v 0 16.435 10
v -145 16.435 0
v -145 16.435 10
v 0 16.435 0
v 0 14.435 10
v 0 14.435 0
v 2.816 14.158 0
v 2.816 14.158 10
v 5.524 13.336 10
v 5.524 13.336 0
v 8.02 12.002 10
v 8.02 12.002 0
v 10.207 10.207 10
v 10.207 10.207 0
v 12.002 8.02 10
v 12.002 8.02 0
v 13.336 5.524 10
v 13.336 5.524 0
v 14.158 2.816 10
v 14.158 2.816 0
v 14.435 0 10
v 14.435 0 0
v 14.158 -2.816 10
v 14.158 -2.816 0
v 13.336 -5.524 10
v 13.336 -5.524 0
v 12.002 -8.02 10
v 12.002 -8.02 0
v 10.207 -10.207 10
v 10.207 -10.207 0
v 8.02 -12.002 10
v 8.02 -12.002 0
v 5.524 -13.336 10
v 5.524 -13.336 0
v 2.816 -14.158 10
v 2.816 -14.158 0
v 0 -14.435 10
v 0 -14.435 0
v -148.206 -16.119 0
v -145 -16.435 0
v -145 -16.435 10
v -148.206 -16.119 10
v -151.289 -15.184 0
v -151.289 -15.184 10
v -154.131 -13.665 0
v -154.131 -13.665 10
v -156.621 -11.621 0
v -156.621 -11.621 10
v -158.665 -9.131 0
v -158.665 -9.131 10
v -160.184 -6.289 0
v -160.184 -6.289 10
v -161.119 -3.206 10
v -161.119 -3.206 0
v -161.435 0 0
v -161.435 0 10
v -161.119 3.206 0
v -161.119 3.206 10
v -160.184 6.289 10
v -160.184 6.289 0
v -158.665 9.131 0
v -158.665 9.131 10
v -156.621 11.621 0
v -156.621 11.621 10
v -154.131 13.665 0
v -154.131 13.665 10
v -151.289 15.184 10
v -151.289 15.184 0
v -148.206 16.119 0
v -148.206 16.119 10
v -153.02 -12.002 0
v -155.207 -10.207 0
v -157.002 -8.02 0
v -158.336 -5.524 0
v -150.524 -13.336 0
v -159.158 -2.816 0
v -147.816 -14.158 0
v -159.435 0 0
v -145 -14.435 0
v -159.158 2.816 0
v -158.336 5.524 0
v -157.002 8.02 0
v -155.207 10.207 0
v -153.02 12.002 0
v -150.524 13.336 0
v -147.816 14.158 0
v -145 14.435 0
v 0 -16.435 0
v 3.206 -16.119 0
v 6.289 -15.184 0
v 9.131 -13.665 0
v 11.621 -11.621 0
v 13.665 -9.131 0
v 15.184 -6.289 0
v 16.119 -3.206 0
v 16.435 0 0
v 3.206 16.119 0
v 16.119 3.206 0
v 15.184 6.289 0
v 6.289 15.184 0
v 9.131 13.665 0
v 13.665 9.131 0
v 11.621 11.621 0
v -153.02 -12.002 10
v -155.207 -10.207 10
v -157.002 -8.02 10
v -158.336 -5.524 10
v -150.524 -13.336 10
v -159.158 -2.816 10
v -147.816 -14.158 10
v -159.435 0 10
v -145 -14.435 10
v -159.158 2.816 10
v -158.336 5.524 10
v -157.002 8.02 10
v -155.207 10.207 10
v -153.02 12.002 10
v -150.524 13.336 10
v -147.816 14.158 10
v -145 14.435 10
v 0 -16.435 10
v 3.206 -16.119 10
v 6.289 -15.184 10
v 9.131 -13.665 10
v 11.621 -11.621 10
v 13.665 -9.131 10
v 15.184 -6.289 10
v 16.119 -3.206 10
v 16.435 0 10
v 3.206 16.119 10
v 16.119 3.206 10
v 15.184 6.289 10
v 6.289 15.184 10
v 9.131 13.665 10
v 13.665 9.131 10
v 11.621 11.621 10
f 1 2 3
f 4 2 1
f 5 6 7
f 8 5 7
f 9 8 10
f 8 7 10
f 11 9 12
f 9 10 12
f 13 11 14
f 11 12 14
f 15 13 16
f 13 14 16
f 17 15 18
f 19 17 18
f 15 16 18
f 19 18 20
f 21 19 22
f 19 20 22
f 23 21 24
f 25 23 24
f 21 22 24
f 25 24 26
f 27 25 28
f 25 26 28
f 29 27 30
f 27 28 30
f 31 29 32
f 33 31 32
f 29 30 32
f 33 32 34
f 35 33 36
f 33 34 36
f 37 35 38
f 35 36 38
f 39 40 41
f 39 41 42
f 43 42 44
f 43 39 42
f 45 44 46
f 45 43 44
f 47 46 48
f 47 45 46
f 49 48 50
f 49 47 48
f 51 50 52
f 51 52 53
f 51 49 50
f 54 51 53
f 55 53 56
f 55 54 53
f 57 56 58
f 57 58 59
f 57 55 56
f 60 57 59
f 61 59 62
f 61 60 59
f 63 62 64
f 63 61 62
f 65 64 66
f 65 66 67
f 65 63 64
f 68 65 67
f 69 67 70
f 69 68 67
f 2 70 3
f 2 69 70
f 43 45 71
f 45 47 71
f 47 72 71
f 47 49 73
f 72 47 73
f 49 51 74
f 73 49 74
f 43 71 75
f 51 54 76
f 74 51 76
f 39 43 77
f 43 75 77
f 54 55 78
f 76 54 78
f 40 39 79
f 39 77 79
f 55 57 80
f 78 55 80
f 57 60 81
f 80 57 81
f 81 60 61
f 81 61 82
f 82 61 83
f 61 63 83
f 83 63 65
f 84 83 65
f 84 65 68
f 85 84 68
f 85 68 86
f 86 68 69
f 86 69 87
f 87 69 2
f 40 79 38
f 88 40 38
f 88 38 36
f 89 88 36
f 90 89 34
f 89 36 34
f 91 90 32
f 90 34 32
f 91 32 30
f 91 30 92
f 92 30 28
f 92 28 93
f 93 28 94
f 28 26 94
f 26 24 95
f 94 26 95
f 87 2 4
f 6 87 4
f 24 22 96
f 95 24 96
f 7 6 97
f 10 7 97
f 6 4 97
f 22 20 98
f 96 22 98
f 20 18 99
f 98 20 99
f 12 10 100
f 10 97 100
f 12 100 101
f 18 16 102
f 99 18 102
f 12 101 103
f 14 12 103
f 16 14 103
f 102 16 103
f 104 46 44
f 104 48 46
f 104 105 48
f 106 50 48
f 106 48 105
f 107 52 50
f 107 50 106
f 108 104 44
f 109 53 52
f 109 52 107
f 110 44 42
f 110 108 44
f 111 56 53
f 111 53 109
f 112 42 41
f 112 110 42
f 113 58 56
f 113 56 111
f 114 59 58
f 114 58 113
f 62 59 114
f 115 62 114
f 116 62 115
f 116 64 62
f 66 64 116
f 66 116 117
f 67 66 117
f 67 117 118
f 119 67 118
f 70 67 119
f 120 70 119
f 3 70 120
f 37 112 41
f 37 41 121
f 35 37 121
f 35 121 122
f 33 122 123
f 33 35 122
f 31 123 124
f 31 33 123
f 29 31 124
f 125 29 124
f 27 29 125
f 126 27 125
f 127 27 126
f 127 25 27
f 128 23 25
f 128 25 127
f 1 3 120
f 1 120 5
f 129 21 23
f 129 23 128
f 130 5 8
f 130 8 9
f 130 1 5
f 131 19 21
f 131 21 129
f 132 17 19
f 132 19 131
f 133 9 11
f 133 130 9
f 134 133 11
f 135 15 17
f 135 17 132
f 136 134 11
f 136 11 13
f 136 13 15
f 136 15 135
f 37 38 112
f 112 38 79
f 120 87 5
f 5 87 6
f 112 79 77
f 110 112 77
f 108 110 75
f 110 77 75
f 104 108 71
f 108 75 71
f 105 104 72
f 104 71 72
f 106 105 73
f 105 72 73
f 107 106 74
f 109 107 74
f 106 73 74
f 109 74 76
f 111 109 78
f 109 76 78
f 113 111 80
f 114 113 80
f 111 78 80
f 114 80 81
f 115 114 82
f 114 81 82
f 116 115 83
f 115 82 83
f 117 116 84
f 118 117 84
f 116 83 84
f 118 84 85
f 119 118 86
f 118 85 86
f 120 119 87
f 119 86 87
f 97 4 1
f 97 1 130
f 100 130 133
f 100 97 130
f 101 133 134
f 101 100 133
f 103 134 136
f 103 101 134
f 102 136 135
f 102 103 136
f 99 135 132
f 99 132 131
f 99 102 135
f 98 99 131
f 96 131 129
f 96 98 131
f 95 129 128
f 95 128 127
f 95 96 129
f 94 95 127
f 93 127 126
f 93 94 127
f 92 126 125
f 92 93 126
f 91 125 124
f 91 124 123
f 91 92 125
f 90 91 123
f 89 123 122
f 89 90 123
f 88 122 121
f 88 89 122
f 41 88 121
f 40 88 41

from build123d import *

# Parameters (mm, degrees)
SHEET_EXTRUDE_1_1_DEPTH = 10
THICKEN_1_T1            = 2


with BuildPart() as body_1:
    # Sheet Extrude 1: a surface, the sketch's curves swept straight by 10 mm
    with BuildLine(Plane.XY, mode=Mode.PRIVATE) as sheet_extrude_1_1_path:
        Line((0, -14.435), (-145, -14.435))
        ThreePointArc((-145, -14.435), (-159.435, 0), (-145, 14.435))
        Line((-145, 14.435), (0, 14.435))
        ThreePointArc((0, 14.435), (14.435, 0), (0, -14.435))
    sheet_extrude_1_1 = Shell.extrude(sheet_extrude_1_1_path.wire(), (0 * SHEET_EXTRUDE_1_1_DEPTH, 0 * SHEET_EXTRUDE_1_1_DEPTH, 1 * SHEET_EXTRUDE_1_1_DEPTH))
    add(Solid.thicken(sheet_extrude_1_1, THICKEN_1_T1))


solid = body_1.part
